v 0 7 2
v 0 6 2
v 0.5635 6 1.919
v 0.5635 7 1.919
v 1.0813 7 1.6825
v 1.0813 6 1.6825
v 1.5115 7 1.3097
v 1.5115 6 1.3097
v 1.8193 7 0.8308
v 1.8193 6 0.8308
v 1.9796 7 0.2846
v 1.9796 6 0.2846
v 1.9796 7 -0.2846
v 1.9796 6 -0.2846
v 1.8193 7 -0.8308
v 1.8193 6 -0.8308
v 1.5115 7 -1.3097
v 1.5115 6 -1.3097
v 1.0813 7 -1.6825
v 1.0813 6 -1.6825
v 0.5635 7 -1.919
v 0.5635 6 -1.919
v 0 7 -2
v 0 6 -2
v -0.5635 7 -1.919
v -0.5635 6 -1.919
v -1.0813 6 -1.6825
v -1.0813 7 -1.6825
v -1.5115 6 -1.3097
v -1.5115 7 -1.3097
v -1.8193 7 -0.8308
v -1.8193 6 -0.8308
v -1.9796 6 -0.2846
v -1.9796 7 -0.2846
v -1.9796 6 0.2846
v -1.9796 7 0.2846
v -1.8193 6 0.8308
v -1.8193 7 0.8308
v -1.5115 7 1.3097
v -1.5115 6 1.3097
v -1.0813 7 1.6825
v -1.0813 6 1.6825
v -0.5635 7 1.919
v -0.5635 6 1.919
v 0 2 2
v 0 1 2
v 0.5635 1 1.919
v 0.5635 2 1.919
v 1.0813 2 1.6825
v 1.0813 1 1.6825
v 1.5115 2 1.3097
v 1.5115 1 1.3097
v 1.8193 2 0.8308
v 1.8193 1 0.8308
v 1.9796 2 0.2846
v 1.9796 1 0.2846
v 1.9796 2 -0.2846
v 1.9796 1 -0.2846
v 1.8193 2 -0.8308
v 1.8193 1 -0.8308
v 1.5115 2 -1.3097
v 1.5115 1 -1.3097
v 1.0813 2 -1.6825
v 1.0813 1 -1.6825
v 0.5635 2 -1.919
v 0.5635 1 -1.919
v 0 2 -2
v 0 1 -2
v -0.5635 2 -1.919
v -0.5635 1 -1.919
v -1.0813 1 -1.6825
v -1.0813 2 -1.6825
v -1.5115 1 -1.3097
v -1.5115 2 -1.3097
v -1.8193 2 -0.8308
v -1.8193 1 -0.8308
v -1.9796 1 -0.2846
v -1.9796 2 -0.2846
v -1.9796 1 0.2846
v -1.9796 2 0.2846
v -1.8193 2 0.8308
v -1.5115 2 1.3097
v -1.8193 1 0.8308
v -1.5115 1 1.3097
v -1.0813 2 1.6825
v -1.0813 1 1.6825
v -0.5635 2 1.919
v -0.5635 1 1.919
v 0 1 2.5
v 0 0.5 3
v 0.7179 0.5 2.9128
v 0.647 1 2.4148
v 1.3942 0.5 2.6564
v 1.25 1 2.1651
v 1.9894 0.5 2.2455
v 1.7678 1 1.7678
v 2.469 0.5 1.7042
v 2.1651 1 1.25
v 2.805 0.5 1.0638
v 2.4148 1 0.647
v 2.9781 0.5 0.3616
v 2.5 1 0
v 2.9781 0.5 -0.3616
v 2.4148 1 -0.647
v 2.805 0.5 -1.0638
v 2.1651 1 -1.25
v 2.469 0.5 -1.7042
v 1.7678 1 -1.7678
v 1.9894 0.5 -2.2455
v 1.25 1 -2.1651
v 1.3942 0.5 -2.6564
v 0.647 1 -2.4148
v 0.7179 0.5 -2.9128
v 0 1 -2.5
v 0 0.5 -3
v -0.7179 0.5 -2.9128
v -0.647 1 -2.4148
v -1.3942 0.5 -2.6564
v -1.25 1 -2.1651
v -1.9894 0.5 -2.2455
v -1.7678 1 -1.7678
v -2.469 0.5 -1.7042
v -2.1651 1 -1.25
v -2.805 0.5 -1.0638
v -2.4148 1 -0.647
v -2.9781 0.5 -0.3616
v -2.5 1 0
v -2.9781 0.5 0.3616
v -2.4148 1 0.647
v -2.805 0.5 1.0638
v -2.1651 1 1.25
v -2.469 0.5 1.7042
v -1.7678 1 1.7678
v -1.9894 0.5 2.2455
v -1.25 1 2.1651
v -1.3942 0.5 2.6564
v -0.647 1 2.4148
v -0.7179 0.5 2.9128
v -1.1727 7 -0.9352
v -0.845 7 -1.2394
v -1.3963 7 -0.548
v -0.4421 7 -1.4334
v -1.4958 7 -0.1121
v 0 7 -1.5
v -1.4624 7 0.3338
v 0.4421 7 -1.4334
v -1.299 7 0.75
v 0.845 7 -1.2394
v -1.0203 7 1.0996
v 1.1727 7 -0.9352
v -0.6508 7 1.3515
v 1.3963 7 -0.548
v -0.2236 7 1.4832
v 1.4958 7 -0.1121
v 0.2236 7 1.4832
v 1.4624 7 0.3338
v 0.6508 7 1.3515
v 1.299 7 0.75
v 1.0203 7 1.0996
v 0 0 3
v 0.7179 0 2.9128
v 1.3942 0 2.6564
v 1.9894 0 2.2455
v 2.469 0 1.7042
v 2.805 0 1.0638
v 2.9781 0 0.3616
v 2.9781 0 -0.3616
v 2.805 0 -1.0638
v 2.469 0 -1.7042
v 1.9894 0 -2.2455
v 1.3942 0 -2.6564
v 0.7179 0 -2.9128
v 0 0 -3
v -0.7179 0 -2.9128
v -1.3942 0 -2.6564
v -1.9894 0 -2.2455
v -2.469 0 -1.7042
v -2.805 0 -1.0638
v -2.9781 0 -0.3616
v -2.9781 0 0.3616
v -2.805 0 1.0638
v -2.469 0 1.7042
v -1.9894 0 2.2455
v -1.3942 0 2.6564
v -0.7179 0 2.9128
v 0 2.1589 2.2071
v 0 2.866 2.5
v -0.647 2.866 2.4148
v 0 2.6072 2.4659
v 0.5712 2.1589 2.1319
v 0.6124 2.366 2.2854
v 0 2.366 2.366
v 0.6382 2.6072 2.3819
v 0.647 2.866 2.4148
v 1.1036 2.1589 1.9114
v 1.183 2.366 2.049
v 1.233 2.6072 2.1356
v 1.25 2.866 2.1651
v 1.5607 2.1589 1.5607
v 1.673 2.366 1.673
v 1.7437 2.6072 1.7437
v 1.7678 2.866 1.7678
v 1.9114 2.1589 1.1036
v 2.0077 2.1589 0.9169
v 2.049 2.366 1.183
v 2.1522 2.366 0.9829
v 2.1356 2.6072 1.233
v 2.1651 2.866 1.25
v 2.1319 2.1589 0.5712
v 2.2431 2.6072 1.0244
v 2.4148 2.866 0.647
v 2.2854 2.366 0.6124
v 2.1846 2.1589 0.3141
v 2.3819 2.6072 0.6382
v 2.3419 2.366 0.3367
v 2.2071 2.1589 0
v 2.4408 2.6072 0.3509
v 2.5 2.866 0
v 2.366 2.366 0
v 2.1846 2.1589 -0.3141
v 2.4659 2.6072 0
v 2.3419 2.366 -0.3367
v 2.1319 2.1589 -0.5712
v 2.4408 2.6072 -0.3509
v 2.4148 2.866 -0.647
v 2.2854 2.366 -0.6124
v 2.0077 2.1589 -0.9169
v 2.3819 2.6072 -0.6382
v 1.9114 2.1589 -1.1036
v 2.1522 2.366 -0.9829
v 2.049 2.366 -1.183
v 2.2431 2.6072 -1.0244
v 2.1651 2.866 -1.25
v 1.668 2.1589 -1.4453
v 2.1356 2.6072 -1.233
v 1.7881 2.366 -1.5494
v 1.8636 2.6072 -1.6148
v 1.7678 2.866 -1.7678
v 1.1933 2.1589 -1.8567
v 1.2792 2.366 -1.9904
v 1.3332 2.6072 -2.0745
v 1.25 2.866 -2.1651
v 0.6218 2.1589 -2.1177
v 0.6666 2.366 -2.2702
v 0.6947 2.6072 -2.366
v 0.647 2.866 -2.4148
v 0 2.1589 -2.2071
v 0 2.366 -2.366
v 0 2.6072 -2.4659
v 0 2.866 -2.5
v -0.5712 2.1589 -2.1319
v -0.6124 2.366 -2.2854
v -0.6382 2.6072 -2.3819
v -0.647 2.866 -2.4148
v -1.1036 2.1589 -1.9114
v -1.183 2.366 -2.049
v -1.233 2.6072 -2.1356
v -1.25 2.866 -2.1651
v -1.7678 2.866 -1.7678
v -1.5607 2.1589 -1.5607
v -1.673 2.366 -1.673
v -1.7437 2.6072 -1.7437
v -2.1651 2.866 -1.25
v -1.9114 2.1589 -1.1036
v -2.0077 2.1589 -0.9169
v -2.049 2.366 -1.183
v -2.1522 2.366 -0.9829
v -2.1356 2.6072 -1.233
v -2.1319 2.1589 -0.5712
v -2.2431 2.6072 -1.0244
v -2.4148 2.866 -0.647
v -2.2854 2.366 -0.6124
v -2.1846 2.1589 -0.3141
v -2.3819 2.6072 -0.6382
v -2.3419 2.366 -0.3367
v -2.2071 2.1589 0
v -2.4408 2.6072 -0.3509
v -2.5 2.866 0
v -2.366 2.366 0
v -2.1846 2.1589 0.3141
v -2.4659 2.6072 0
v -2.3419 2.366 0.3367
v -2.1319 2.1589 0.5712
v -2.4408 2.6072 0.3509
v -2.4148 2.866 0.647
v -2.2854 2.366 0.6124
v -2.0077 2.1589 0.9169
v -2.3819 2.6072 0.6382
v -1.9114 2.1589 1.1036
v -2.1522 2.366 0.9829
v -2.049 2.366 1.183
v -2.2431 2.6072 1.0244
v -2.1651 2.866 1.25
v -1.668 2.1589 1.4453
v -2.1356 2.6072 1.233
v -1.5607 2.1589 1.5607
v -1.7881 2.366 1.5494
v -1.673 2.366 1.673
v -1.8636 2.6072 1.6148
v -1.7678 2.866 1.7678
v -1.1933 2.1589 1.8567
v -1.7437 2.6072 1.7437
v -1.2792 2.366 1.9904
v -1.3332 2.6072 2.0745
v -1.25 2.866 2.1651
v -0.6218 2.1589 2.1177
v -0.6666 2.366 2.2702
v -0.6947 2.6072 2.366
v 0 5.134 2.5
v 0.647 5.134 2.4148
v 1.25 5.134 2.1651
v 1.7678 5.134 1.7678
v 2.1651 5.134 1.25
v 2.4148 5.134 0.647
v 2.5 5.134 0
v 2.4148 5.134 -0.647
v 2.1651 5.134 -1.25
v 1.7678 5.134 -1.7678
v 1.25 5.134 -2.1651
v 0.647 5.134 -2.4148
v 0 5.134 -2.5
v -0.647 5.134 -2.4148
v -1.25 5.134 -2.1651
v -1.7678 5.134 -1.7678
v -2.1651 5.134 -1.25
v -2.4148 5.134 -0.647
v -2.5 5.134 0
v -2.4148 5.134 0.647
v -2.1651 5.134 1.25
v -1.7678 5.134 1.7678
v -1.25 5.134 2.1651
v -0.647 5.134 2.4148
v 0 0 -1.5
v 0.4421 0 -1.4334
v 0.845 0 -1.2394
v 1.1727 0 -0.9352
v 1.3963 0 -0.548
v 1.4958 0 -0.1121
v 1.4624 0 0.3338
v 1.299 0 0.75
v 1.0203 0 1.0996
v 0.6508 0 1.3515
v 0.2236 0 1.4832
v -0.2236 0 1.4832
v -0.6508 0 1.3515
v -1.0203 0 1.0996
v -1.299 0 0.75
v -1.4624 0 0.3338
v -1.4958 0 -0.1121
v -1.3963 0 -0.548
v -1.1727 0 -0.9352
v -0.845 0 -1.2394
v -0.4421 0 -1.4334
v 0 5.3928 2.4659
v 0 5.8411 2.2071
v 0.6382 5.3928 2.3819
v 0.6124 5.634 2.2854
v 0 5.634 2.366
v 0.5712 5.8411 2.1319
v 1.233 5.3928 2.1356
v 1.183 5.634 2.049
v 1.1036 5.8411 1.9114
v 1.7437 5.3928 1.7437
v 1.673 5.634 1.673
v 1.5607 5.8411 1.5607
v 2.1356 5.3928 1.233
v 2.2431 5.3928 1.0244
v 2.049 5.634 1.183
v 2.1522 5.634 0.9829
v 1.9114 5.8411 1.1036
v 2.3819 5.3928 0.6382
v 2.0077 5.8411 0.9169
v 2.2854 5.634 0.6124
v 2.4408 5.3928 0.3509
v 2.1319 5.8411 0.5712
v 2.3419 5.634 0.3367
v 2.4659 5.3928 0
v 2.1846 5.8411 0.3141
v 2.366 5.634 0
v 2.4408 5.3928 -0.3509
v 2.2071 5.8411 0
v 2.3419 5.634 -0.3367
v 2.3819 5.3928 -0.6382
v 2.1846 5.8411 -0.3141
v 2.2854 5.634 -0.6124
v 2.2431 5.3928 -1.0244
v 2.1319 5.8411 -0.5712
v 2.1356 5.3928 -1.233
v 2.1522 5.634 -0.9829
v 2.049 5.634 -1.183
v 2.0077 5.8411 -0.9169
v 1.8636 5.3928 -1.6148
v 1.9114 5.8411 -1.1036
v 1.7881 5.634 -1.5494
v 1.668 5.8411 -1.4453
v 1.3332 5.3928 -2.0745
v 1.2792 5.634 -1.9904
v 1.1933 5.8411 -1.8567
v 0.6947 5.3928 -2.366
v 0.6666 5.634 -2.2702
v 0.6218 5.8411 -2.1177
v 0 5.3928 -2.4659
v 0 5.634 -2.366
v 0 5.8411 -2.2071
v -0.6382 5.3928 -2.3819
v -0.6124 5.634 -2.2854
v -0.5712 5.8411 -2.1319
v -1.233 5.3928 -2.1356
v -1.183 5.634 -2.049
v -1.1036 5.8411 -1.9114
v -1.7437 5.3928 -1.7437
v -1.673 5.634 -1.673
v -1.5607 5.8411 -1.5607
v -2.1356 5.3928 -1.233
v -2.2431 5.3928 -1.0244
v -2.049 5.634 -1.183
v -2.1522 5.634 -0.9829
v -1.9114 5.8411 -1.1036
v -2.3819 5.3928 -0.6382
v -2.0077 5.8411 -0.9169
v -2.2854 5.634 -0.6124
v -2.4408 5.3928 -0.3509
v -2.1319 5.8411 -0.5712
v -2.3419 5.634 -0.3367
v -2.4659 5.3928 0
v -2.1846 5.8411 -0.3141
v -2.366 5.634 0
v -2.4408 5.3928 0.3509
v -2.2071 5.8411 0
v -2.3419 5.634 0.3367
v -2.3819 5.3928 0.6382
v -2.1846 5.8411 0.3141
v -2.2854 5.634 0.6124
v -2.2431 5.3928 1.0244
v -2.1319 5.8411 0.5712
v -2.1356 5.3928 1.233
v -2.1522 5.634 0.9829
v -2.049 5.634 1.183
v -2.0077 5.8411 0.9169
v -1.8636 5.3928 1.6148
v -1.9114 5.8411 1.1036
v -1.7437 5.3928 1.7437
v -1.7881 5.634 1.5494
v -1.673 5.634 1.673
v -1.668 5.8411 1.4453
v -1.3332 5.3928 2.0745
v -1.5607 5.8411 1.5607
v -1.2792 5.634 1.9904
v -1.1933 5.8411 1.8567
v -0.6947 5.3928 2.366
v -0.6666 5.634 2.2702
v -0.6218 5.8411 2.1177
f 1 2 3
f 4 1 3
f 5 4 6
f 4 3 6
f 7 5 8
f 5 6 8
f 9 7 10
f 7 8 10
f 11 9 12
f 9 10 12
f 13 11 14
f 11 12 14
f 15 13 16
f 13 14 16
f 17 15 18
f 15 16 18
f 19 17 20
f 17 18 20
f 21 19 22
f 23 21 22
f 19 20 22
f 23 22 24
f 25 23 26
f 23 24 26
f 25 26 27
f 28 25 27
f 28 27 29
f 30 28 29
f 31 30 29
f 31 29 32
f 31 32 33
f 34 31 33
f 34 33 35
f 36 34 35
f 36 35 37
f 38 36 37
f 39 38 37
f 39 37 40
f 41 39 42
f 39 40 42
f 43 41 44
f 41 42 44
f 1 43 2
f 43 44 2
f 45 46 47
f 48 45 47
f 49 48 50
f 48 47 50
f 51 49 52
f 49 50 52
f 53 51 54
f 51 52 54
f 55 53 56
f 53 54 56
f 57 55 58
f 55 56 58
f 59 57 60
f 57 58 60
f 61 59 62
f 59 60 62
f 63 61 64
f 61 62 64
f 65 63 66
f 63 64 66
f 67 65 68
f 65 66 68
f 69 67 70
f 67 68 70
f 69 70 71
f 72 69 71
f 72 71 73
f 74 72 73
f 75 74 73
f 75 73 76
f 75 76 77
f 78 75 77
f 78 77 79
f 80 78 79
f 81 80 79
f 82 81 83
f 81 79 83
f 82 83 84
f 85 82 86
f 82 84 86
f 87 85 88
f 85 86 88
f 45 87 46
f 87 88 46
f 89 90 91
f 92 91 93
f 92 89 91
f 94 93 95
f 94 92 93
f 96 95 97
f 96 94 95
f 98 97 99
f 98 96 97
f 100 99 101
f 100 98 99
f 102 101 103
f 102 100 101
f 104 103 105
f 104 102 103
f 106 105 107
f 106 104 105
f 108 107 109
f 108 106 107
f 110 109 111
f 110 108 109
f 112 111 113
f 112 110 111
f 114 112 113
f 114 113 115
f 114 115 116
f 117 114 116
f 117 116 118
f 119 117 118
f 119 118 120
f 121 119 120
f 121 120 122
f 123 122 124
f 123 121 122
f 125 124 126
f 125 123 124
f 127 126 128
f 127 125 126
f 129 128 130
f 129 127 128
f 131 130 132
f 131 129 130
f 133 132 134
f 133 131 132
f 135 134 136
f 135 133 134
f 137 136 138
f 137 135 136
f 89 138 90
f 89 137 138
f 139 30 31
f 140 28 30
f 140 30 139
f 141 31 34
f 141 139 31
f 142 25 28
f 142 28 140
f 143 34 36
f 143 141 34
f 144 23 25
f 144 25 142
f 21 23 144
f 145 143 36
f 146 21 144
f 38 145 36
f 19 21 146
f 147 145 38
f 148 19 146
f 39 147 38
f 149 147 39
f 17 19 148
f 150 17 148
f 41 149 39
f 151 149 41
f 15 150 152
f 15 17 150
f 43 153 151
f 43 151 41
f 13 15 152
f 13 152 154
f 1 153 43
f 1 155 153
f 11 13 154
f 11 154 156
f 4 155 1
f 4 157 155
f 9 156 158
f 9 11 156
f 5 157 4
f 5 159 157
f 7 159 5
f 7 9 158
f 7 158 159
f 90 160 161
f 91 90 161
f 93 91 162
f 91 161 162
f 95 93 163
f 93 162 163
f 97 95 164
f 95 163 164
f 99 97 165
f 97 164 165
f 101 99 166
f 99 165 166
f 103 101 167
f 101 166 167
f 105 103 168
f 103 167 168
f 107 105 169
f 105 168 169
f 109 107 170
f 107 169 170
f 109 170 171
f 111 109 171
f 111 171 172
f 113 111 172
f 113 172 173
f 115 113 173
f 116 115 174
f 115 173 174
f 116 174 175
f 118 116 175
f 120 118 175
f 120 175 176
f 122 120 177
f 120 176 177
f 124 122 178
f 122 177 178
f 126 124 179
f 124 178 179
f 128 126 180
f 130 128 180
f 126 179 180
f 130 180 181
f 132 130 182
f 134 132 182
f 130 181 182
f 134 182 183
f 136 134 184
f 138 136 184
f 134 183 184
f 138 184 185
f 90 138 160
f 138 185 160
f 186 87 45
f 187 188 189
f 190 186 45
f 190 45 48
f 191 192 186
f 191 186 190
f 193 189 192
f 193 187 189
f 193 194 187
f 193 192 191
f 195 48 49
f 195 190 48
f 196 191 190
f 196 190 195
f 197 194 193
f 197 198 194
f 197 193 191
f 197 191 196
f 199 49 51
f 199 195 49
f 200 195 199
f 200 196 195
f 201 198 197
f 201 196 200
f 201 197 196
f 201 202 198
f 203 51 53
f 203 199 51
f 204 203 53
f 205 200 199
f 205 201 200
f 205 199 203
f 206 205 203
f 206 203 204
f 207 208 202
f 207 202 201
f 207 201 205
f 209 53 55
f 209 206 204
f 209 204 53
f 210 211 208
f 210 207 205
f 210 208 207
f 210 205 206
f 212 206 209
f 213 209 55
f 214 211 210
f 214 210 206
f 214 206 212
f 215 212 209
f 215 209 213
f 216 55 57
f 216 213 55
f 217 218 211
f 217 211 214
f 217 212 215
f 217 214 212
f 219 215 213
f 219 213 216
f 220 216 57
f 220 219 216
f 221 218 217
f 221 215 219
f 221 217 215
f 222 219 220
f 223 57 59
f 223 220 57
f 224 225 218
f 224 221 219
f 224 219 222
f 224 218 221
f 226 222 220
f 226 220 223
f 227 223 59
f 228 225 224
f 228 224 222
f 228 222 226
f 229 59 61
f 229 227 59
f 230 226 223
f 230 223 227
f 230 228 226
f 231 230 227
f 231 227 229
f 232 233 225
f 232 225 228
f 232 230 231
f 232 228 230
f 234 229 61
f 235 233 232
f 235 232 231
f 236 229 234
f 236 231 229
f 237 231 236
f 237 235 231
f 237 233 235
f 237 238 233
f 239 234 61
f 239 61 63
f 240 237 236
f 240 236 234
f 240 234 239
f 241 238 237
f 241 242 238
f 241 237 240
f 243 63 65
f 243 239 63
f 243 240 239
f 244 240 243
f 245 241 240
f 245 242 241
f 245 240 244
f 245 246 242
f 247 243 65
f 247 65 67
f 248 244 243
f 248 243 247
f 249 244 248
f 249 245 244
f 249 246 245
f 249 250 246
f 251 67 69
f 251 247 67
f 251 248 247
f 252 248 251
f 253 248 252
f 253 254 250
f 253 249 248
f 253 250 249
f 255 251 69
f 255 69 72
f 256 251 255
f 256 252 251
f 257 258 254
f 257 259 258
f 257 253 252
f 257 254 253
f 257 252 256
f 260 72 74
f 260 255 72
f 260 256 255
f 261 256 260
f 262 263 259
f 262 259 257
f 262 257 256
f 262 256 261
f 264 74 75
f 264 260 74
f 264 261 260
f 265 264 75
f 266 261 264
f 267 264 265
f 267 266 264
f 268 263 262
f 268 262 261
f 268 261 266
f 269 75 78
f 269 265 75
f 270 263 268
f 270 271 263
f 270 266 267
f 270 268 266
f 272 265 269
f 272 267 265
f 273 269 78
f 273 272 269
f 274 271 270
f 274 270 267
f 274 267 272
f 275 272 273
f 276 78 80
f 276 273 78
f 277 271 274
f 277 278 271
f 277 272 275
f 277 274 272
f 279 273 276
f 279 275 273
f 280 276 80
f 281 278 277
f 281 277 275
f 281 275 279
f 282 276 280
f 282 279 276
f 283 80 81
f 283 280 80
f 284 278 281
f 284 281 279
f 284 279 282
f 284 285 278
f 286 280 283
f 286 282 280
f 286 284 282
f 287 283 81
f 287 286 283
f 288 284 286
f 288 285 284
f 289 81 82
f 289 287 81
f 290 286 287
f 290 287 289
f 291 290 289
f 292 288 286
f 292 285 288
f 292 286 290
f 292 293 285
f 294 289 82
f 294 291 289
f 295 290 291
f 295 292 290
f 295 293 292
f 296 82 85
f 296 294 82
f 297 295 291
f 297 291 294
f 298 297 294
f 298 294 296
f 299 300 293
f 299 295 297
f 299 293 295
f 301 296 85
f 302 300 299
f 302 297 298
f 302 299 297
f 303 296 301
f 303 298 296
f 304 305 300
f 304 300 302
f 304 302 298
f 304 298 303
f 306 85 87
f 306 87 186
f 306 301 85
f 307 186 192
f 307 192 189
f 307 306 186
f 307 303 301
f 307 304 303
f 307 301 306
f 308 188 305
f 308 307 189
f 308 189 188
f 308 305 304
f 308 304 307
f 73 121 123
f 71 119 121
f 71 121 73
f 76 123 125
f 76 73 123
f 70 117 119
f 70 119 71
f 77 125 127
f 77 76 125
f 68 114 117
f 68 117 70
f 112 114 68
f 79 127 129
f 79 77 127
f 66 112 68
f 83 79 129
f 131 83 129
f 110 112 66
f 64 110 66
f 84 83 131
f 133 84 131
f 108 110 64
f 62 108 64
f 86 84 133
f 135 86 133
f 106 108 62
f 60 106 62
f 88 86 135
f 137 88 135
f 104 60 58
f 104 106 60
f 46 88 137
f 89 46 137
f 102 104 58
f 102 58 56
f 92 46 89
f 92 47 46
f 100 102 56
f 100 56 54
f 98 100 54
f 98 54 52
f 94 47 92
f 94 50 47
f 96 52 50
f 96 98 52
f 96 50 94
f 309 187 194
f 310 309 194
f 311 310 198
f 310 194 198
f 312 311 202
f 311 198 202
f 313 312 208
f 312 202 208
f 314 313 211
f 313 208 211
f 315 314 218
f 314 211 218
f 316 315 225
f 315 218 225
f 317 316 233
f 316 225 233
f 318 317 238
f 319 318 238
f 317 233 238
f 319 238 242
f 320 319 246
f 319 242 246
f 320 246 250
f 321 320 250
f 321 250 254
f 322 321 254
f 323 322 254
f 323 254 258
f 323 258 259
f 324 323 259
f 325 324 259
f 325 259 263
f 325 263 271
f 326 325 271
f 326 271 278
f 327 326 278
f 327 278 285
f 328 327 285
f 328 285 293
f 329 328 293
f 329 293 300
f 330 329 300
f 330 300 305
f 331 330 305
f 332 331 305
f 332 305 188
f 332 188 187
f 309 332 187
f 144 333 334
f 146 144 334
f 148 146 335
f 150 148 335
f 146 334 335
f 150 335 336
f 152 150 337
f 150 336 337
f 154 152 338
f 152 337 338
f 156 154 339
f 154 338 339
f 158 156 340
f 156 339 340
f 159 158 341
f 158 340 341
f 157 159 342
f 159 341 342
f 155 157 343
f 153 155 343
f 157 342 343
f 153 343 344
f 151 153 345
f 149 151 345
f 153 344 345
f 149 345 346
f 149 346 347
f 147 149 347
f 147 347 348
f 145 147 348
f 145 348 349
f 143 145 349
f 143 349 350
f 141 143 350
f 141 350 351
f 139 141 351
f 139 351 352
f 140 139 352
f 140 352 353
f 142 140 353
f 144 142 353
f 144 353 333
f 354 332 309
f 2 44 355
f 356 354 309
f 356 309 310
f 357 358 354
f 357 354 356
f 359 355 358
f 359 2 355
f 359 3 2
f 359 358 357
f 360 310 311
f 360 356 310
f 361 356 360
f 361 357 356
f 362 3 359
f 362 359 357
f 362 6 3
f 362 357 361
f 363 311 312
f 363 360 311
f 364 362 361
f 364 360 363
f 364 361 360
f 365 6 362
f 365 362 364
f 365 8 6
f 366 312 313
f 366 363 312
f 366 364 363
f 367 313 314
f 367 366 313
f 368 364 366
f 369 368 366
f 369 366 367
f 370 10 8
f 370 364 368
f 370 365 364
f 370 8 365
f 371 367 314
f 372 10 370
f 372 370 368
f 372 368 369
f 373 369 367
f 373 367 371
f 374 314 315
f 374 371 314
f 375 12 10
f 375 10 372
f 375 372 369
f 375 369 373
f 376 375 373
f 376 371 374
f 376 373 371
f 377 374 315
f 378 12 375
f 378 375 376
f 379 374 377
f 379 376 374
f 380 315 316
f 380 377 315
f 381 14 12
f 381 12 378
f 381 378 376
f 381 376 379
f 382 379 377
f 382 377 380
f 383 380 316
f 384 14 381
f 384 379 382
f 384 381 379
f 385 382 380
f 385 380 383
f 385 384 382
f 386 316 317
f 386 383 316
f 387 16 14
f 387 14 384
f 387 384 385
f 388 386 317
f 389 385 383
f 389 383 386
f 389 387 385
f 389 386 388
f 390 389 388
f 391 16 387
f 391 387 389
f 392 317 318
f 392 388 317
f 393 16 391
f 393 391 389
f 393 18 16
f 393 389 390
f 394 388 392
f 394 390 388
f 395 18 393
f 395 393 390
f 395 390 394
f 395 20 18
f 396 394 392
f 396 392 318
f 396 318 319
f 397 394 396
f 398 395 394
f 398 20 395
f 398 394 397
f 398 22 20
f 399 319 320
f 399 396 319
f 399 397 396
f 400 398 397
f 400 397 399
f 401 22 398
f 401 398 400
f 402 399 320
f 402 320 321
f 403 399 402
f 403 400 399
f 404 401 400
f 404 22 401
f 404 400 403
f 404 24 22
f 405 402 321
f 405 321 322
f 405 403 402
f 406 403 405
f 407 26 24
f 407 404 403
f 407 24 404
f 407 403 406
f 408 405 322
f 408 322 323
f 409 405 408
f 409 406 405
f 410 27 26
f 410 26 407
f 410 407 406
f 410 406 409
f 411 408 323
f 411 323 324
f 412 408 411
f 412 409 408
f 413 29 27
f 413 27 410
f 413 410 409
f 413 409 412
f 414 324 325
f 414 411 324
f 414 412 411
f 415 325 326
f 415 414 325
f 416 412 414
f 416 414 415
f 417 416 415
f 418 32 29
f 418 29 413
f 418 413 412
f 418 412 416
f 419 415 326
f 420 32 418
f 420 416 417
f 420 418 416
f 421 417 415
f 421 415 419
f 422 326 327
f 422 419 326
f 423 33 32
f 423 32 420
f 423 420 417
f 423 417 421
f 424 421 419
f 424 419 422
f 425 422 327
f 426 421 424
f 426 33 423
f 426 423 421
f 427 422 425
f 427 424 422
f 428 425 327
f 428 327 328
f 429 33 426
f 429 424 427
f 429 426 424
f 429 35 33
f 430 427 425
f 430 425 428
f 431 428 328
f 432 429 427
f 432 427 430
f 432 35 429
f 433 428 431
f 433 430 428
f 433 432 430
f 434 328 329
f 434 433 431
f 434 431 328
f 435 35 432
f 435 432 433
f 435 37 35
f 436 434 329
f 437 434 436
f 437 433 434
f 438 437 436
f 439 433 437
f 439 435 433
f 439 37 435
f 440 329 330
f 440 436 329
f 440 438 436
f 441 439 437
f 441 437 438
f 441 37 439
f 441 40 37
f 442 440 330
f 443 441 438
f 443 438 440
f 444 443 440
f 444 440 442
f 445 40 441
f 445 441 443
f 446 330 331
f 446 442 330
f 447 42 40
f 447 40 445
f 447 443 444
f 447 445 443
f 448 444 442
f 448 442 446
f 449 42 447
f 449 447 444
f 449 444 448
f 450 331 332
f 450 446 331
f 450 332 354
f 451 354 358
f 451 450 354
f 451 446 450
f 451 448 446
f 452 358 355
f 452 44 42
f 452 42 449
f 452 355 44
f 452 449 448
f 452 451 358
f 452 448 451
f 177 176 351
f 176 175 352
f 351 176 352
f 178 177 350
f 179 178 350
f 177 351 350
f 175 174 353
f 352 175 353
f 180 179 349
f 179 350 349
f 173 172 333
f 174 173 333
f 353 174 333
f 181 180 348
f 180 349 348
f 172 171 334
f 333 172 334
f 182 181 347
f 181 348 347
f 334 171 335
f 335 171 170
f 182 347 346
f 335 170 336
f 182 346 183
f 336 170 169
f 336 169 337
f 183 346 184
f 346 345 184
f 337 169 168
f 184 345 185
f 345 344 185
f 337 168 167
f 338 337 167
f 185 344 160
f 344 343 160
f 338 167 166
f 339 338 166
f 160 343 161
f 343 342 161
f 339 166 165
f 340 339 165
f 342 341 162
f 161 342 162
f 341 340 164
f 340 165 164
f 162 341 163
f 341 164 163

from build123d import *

# Parameters (mm, degrees)
SKETCH1_R           = 3
BOSS_EXTRUDE1_DEPTH = 1
CHAMFER1_SIZE       = 0.5
SKETCH2_R           = 2
BOSS_EXTRUDE2_DEPTH = 1
SKETCH3_R           = 2.5
BOSS_EXTRUDE3_DEPTH = 4
SKETCH4_R           = 2
BOSS_EXTRUDE4_DEPTH = 1
FILLET1_R           = 1
FILLET2_R           = 1
SKETCH5_R           = 1.5
CUT_EXTRUDE1_DEPTH  = 10


with BuildPart() as part:
    # Sketch1 → Boss-Extrude1 (new body)
    with BuildSketch(Plane(origin=(0, 0, 0), x_dir=(1, 0, 0), z_dir=(0, 1, 0))):
        with Locations(Location((0, 0, 0), (0, 0, 270))):
            Circle(SKETCH1_R)
    extrude(amount=BOSS_EXTRUDE1_DEPTH)

    # Chamfer1
    chamfer1_edges = [part.edges().sort_by_distance(p)[0] for p in [
        (0, 1, -3),
    ]]
    chamfer(chamfer1_edges, length=CHAMFER1_SIZE)

    # Sketch2 → Boss-Extrude2 (add)
    with BuildSketch(Plane(origin=(0, 1, 0), x_dir=(1, 0, 0), z_dir=(0, 1, 0))):
        with Locations(Location((0, 0, 0), (0, 0, 270))):
            Circle(SKETCH2_R)
    extrude(amount=BOSS_EXTRUDE2_DEPTH)

    # Sketch3 → Boss-Extrude3 (add)
    with BuildSketch(Plane(origin=(0, 2, 0), x_dir=(1, 0, 0), z_dir=(0, 1, 0))):
        with Locations(Location((0, 0, 0), (0, 0, 270))):
            Circle(SKETCH3_R)
    extrude(amount=BOSS_EXTRUDE3_DEPTH)

    # Sketch4 → Boss-Extrude4 (add)
    with BuildSketch(Plane(origin=(0, 6, 0), x_dir=(1, 0, 0), z_dir=(0, 1, 0))):
        with Locations(Location((0, 0, 0), (0, 0, 270))):
            Circle(SKETCH4_R)
    extrude(amount=BOSS_EXTRUDE4_DEPTH)

    # Fillet1
    # the kernel refuses this fillet: 1 mm, written as the material it takes off along each edge
    with BuildSketch(Plane(origin=(0, 6, 0), x_dir=(0, 0, 1), z_dir=(-1, 0, 0))) as fillet1_piece_1:
        with BuildLine():
            CenterArc((1.5, -0.866025404), FILLET1_R, 0, 60)
            Line((2, 0), (2.01, 0.017320508))
            ThreePointArc((2.01, 0.017320508), (2.25, 0.02), (2.5, 0.02))
            Line((2.5, 0.02), (2.52, 0))
            Line((2.52, 0), (2.52, -0.866025404))
            Line((2.52, -0.866025404), (2.5, -0.866025404))
        make_face()
    revolve(axis=Axis((0, 6, 0), (0, 1, 0)), mode=Mode.SUBTRACT)

    # Fillet2
    # the kernel refuses this fillet: 1 mm, written as the material it takes off along each edge
    with BuildSketch(Plane(origin=(0, 2, 0), x_dir=(0, 0, 1), z_dir=(-1, 0, 0))) as fillet2_piece_1:
        with BuildLine():
            CenterArc((1.5, 0.866025404), FILLET2_R, 300, 60)
            Line((2, 0), (2.01, -0.017320508))
            ThreePointArc((2.01, -0.017320508), (2.25, -0.02), (2.5, -0.02))
            Line((2.5, -0.02), (2.52, 0))
            Line((2.52, 0), (2.52, 0.866025404))
            Line((2.52, 0.866025404), (2.5, 0.866025404))
        make_face()
    revolve(axis=Axis((0, 2, 0), (0, 1, 0)), mode=Mode.SUBTRACT)

    # Sketch5 → Cut-Extrude1 (cut)
    with BuildSketch(Plane.XZ):
        with Locations(Location((0, 0, 0), (0, 0, 270))):
            Circle(SKETCH5_R)
    extrude(amount=-CUT_EXTRUDE1_DEPTH, mode=Mode.SUBTRACT)


solid = part.part
